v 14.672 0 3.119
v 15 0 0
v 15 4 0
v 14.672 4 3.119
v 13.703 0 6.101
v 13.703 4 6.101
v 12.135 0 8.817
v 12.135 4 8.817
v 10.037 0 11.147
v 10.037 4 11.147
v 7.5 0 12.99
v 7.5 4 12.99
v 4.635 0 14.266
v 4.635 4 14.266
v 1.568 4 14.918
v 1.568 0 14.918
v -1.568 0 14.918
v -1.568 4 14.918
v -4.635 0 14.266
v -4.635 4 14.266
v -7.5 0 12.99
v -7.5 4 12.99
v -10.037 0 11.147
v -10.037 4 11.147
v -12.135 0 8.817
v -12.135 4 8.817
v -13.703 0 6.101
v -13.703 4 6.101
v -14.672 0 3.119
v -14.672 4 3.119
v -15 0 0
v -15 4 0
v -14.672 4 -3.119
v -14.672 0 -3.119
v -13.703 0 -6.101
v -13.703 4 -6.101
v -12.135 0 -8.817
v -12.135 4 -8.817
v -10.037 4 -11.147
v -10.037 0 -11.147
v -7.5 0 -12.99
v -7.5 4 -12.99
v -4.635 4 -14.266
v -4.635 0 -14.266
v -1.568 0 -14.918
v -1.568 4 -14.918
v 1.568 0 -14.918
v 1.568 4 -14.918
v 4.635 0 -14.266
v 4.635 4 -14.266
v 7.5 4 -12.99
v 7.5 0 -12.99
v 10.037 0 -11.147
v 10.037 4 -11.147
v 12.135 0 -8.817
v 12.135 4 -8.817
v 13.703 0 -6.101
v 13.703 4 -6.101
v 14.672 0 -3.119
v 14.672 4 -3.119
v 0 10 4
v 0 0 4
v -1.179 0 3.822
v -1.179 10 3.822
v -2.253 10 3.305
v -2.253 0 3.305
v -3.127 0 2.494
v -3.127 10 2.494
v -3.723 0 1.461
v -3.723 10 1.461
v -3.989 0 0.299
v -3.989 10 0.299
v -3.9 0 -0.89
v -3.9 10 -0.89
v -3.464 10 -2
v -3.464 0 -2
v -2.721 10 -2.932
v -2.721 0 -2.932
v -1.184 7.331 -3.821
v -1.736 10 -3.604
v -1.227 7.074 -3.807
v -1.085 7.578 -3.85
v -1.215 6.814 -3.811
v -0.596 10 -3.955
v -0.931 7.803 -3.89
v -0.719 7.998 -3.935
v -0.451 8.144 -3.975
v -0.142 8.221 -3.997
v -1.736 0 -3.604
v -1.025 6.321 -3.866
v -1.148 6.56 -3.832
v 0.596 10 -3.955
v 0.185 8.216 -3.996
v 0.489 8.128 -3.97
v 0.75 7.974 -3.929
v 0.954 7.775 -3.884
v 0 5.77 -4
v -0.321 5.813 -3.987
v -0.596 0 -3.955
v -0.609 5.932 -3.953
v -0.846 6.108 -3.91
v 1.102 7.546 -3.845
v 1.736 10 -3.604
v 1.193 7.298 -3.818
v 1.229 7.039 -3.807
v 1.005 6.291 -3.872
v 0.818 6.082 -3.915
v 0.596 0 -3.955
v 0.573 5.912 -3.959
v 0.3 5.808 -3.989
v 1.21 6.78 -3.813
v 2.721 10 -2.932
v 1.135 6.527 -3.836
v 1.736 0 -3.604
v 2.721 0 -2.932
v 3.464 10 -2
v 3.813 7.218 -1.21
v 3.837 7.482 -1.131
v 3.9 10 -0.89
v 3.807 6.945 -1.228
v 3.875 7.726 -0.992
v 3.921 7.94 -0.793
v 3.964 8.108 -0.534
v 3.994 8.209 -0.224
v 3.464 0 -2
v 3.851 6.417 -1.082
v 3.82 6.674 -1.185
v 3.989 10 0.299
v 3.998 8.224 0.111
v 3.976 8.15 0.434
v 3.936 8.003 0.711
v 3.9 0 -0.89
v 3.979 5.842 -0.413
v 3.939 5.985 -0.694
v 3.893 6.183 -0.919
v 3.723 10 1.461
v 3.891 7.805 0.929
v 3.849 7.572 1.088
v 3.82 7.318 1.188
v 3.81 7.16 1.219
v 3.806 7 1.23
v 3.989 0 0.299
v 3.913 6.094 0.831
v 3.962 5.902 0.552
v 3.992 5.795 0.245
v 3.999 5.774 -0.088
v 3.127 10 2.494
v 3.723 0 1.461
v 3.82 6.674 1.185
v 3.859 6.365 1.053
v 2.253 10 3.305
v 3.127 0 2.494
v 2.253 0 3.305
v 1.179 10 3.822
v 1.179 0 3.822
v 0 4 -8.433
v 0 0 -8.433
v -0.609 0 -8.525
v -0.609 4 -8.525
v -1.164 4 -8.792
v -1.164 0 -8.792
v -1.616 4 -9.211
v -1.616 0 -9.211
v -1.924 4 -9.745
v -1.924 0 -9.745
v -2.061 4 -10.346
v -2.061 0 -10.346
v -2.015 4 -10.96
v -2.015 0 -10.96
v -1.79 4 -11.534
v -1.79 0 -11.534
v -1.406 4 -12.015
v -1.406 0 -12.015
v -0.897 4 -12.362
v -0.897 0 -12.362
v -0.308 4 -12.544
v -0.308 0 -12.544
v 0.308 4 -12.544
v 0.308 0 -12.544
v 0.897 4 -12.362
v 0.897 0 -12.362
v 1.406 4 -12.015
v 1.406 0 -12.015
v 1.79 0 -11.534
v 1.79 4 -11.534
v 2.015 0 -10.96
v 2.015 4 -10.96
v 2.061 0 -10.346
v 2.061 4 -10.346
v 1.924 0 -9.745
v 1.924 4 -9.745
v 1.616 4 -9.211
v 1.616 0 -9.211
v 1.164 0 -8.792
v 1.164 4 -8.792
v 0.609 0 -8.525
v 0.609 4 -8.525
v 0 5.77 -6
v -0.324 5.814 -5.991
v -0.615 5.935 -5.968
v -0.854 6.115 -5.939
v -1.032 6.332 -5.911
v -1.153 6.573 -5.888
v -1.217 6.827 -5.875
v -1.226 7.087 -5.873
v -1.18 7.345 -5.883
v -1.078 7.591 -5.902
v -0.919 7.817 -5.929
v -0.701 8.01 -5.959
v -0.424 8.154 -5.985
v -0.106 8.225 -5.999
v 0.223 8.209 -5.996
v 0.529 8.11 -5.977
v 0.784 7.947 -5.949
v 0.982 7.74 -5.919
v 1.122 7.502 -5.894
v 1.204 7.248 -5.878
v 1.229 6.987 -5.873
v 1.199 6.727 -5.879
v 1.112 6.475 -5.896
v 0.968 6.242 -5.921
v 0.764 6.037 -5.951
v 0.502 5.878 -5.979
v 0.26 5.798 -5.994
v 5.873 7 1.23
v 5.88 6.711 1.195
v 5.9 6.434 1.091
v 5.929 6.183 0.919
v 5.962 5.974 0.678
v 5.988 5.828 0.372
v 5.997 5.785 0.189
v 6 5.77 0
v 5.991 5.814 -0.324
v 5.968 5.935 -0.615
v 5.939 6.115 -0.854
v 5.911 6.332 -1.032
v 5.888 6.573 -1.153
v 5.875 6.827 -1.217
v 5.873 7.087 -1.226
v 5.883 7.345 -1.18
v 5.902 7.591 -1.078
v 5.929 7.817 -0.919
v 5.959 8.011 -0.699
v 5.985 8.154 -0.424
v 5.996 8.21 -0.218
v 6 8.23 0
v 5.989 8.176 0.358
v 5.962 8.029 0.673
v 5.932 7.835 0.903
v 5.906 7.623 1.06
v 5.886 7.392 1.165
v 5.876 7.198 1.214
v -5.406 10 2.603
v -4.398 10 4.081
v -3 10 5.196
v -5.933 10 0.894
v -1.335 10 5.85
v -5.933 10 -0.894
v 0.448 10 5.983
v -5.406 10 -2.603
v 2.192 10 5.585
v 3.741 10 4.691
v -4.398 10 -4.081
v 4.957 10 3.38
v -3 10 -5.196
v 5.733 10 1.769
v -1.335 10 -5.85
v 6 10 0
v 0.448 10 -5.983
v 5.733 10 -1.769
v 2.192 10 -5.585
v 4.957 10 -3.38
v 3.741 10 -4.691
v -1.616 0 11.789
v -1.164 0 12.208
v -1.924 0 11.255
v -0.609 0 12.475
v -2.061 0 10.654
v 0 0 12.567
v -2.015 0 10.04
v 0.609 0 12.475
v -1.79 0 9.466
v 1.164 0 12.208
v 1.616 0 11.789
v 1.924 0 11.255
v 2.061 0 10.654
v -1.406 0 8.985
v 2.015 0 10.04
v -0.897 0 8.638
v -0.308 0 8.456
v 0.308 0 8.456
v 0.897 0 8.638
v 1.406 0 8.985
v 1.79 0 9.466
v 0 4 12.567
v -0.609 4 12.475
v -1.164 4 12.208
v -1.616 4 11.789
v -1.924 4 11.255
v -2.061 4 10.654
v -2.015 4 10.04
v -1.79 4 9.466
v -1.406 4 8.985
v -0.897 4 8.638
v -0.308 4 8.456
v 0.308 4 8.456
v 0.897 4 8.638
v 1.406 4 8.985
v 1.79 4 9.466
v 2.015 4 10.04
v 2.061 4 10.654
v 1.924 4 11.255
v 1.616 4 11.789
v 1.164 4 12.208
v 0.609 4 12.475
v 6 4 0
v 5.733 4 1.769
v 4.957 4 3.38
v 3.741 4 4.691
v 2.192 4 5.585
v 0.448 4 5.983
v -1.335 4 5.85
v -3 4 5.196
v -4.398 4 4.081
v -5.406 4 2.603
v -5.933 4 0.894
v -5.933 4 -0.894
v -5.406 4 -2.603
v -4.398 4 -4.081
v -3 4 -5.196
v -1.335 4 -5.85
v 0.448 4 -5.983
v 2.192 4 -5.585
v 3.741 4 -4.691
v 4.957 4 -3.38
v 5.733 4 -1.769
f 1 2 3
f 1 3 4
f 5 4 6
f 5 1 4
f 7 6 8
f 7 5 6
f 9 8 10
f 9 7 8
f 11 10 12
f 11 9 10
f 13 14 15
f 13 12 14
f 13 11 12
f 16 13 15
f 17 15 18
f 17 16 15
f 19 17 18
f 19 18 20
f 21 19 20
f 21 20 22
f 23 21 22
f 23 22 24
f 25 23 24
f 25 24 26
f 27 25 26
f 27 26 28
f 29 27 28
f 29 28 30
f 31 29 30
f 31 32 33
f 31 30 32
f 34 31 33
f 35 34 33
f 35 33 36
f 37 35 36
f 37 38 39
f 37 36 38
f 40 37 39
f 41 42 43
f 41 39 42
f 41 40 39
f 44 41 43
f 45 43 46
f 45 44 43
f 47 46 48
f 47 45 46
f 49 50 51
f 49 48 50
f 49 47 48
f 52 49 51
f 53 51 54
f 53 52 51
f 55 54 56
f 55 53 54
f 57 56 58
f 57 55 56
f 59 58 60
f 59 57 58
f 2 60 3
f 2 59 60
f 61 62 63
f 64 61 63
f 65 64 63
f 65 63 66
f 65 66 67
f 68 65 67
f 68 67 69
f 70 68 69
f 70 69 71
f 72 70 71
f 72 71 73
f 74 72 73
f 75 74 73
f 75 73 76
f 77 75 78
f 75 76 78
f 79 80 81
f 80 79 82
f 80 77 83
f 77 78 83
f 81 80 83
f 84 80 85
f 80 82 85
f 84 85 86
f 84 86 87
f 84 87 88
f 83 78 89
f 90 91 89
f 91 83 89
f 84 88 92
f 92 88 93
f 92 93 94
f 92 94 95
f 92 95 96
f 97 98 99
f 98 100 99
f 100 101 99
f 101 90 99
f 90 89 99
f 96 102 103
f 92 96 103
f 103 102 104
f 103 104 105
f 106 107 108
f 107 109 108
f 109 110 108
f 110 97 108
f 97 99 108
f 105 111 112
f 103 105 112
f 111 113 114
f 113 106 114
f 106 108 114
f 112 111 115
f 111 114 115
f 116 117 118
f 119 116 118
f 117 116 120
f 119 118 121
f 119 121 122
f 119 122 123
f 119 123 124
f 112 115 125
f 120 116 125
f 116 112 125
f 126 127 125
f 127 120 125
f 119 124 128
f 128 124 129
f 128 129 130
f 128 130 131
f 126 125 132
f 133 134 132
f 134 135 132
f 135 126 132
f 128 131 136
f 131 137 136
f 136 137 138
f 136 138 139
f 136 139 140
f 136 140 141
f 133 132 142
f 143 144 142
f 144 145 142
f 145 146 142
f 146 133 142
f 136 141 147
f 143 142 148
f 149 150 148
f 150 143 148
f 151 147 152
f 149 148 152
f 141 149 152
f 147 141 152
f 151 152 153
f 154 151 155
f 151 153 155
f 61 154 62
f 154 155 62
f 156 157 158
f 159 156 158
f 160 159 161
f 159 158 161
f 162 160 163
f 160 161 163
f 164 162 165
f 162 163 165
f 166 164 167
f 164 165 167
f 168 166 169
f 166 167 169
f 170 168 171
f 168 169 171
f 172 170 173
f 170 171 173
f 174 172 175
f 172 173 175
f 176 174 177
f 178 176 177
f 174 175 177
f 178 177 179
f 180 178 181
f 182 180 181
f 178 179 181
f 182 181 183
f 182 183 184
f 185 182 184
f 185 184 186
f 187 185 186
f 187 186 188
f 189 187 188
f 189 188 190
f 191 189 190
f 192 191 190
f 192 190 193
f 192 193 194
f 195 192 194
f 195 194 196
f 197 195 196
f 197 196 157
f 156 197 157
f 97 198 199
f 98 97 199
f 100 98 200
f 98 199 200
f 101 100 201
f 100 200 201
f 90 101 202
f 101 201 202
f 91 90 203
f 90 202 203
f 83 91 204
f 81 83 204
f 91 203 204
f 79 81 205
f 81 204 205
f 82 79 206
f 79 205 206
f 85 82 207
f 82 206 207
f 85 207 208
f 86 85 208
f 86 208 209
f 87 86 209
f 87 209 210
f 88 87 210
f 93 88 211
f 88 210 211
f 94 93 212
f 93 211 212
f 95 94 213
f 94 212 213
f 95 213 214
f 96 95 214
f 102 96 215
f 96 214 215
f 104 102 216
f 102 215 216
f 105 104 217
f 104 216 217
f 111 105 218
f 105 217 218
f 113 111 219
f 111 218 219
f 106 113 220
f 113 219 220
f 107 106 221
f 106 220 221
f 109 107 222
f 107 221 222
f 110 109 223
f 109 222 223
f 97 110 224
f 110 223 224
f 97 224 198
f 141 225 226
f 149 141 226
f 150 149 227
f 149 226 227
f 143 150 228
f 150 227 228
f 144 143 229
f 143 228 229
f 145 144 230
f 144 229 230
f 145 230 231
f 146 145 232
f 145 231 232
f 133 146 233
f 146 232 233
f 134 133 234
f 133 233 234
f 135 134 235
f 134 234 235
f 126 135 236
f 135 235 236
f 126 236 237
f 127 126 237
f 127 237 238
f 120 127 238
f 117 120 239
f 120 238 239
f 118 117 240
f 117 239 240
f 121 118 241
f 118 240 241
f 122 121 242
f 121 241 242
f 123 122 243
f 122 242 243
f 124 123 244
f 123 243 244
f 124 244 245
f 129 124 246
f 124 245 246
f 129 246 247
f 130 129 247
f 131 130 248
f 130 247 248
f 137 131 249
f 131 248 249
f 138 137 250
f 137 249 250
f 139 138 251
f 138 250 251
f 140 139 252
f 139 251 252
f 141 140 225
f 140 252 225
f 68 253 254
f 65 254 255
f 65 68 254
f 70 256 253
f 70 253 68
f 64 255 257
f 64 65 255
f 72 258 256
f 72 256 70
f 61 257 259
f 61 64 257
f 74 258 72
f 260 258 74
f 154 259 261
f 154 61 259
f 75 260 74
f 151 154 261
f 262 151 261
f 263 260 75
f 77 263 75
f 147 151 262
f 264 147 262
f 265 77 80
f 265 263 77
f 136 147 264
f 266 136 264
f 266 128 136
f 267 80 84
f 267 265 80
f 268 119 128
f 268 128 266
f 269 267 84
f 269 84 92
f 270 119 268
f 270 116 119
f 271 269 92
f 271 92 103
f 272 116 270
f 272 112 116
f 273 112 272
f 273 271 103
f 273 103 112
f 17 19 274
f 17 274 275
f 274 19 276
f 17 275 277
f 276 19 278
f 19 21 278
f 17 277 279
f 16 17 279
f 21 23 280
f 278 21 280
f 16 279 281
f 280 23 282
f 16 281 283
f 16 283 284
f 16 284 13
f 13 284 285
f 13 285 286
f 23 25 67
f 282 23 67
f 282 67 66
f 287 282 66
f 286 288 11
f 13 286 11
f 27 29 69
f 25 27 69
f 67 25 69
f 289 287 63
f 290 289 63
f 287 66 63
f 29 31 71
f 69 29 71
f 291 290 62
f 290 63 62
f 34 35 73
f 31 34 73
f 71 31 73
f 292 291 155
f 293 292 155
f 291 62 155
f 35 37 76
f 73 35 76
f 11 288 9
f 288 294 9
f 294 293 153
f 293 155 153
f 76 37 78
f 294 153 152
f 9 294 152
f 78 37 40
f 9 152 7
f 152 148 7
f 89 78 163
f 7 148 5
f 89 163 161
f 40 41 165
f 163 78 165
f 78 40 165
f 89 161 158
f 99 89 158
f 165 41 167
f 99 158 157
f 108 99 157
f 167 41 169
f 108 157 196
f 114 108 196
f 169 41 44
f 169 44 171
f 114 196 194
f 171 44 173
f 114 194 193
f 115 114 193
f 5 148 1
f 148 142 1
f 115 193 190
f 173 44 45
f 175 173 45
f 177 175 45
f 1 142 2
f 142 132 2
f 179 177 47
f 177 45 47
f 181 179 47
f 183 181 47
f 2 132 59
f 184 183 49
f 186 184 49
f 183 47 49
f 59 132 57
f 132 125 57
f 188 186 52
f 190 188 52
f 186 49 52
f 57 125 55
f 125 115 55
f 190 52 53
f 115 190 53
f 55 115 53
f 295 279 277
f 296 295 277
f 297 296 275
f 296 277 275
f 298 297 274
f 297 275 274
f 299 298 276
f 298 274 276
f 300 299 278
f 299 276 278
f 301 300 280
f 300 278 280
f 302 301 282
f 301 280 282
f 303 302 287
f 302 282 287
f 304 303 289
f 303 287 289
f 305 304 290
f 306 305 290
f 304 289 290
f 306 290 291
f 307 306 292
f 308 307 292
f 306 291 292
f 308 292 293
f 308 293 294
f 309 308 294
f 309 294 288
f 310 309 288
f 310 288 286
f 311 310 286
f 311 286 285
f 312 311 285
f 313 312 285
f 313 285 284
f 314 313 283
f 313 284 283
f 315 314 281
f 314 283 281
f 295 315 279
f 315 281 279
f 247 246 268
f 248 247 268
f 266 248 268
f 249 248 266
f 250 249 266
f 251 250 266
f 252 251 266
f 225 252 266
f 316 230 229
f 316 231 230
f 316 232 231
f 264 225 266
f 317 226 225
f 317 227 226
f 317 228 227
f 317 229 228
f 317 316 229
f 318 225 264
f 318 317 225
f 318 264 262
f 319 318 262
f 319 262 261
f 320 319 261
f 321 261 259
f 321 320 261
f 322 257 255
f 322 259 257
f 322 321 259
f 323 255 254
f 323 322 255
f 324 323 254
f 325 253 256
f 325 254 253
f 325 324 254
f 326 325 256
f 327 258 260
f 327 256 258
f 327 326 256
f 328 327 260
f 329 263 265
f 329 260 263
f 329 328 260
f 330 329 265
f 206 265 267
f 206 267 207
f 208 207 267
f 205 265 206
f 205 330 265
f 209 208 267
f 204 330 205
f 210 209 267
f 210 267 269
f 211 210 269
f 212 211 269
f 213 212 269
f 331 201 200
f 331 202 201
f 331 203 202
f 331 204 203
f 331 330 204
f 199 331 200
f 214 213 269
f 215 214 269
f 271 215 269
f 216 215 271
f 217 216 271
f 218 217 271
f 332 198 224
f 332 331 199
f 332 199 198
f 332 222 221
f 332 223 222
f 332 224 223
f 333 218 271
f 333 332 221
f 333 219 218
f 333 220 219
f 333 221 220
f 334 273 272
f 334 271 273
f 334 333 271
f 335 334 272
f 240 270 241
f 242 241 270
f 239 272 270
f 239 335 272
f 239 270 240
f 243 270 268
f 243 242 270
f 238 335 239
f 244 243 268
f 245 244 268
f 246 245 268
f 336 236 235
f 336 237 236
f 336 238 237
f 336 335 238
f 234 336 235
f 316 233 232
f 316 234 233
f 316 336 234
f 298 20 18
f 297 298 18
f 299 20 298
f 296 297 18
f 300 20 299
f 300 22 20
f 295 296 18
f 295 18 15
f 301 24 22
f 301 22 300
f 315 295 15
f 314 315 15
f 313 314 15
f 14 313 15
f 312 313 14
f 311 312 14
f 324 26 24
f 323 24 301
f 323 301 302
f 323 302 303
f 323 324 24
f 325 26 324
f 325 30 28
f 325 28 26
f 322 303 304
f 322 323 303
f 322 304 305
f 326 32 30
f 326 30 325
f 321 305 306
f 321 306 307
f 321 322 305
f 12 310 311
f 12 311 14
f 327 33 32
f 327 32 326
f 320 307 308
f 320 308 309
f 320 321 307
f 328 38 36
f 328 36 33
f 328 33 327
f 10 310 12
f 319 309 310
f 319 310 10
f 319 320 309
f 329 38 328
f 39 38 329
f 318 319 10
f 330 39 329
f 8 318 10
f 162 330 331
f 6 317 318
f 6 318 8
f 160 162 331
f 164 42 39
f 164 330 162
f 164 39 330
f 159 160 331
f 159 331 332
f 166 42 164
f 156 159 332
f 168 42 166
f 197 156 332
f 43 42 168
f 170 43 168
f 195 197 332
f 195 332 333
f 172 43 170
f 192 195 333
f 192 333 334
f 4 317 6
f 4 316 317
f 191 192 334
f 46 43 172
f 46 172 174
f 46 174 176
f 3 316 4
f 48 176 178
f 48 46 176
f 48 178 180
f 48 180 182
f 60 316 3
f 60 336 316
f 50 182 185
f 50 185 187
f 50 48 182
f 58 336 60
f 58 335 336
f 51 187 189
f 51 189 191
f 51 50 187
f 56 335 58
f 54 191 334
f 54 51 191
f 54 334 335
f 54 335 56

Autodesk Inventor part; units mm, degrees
ref_plane "YZ Plane" through (0, 0, 0) normal (1, 0, 0) x (0, 1, 0)
ref_plane "XZ Plane" through (0, 0, 0) normal (0, 1, 0) x (-1, 0, 0)
ref_plane "XY Plane" through (0, 0, 0) normal (0, 0, 1) x (1, 0, 0)
sketch "Sketch1" plane through (0, 0, 0) normal (0, 0, 1) x (1, 0, 0)
  line L0 (0, 10) -> (6, 10)
  line L1 (6, 10) -> (6, 4)
  line L2 (6, 4) -> (15, 4)
  line L3 (15, 4) -> (15, 0)
  line L4 (15, 0) -> (0, 0)
  line L5 (0, 0) -> (0, 10)
  dimension "d0" = 4
  dimension "d1" = 10
  dimension "d2" = 15
  dimension "d3" = 6
revolve "Revolution1" add sketch "Sketch1" angle 360 about axis through (0, 0, 0) along (0, 1, 0)
sketch "Sketch2" plane through (0, 10, 0) normal (0, 1, 0) x (1, 0, 0)
  circle A0 centre (0, 0) radius 6
  line L0 (0, 6) -> (0, 15)
  circle A1 centre (0, 0) radius 15
  circle A2 centre (0, 0) radius 6
  circle A3 centre (0, 0) radius 15
  line L1 (0, -6) -> (0, -15)
  point P0 (0, 10.5)
  point P1 (0, -10.5)
  point P2 (0, -10.5)
  point P3 (0, 10.5)
hole "Hole1" at (0, 10, 0) direction (0, -1, 0) diameter 8 end through all
hole "Hole2" at (0, 10, -10.5) at (0, 10, 10.5) direction (0, -1, 0) diameter 4.134 end through all
sketch "Sketch3" plane through (0, 0, 0) normal (1, 0, 0) x (0, 1, 0)
  line L0 (10, 6) -> (10, -6)
  line L1 (4, 6) -> (4, -6)
  line L2 (4, 15) -> (4, -15)
  line L3 (0, 15) -> (0, -15)
  line L4 (10, 0) -> (4, 0)
  line L5 (4, 6) -> (4, -6)
  point P0 (0, 0)
  point P1 (7, 0)
  point P2 (7, 0)
hole "Hole3" at (0, 7, 0) direction (1, 0, 0) diameter 2.459 end through all
sketch "Sketch4" plane through (0, 0, 0) normal (0, 0, 1) x (1, 0, 0)
  line L0 (-15, 4) -> (15, 4)
  line L1 (-15, 0) -> (15, 0)
  line L2 (-4, 10) -> (4, 10)
  line L3 (0, 10) -> (0, 4)
  line L4 (-6, 4) -> (6, 4)
  point P0 (0, 0)
  point P1 (0, 7)
hole "Hole4" at (0, 7, 0) direction (0, 0, -1) diameter 2.459 end through all
properties part number "asbevestiging" material "Aluminum 6061"
